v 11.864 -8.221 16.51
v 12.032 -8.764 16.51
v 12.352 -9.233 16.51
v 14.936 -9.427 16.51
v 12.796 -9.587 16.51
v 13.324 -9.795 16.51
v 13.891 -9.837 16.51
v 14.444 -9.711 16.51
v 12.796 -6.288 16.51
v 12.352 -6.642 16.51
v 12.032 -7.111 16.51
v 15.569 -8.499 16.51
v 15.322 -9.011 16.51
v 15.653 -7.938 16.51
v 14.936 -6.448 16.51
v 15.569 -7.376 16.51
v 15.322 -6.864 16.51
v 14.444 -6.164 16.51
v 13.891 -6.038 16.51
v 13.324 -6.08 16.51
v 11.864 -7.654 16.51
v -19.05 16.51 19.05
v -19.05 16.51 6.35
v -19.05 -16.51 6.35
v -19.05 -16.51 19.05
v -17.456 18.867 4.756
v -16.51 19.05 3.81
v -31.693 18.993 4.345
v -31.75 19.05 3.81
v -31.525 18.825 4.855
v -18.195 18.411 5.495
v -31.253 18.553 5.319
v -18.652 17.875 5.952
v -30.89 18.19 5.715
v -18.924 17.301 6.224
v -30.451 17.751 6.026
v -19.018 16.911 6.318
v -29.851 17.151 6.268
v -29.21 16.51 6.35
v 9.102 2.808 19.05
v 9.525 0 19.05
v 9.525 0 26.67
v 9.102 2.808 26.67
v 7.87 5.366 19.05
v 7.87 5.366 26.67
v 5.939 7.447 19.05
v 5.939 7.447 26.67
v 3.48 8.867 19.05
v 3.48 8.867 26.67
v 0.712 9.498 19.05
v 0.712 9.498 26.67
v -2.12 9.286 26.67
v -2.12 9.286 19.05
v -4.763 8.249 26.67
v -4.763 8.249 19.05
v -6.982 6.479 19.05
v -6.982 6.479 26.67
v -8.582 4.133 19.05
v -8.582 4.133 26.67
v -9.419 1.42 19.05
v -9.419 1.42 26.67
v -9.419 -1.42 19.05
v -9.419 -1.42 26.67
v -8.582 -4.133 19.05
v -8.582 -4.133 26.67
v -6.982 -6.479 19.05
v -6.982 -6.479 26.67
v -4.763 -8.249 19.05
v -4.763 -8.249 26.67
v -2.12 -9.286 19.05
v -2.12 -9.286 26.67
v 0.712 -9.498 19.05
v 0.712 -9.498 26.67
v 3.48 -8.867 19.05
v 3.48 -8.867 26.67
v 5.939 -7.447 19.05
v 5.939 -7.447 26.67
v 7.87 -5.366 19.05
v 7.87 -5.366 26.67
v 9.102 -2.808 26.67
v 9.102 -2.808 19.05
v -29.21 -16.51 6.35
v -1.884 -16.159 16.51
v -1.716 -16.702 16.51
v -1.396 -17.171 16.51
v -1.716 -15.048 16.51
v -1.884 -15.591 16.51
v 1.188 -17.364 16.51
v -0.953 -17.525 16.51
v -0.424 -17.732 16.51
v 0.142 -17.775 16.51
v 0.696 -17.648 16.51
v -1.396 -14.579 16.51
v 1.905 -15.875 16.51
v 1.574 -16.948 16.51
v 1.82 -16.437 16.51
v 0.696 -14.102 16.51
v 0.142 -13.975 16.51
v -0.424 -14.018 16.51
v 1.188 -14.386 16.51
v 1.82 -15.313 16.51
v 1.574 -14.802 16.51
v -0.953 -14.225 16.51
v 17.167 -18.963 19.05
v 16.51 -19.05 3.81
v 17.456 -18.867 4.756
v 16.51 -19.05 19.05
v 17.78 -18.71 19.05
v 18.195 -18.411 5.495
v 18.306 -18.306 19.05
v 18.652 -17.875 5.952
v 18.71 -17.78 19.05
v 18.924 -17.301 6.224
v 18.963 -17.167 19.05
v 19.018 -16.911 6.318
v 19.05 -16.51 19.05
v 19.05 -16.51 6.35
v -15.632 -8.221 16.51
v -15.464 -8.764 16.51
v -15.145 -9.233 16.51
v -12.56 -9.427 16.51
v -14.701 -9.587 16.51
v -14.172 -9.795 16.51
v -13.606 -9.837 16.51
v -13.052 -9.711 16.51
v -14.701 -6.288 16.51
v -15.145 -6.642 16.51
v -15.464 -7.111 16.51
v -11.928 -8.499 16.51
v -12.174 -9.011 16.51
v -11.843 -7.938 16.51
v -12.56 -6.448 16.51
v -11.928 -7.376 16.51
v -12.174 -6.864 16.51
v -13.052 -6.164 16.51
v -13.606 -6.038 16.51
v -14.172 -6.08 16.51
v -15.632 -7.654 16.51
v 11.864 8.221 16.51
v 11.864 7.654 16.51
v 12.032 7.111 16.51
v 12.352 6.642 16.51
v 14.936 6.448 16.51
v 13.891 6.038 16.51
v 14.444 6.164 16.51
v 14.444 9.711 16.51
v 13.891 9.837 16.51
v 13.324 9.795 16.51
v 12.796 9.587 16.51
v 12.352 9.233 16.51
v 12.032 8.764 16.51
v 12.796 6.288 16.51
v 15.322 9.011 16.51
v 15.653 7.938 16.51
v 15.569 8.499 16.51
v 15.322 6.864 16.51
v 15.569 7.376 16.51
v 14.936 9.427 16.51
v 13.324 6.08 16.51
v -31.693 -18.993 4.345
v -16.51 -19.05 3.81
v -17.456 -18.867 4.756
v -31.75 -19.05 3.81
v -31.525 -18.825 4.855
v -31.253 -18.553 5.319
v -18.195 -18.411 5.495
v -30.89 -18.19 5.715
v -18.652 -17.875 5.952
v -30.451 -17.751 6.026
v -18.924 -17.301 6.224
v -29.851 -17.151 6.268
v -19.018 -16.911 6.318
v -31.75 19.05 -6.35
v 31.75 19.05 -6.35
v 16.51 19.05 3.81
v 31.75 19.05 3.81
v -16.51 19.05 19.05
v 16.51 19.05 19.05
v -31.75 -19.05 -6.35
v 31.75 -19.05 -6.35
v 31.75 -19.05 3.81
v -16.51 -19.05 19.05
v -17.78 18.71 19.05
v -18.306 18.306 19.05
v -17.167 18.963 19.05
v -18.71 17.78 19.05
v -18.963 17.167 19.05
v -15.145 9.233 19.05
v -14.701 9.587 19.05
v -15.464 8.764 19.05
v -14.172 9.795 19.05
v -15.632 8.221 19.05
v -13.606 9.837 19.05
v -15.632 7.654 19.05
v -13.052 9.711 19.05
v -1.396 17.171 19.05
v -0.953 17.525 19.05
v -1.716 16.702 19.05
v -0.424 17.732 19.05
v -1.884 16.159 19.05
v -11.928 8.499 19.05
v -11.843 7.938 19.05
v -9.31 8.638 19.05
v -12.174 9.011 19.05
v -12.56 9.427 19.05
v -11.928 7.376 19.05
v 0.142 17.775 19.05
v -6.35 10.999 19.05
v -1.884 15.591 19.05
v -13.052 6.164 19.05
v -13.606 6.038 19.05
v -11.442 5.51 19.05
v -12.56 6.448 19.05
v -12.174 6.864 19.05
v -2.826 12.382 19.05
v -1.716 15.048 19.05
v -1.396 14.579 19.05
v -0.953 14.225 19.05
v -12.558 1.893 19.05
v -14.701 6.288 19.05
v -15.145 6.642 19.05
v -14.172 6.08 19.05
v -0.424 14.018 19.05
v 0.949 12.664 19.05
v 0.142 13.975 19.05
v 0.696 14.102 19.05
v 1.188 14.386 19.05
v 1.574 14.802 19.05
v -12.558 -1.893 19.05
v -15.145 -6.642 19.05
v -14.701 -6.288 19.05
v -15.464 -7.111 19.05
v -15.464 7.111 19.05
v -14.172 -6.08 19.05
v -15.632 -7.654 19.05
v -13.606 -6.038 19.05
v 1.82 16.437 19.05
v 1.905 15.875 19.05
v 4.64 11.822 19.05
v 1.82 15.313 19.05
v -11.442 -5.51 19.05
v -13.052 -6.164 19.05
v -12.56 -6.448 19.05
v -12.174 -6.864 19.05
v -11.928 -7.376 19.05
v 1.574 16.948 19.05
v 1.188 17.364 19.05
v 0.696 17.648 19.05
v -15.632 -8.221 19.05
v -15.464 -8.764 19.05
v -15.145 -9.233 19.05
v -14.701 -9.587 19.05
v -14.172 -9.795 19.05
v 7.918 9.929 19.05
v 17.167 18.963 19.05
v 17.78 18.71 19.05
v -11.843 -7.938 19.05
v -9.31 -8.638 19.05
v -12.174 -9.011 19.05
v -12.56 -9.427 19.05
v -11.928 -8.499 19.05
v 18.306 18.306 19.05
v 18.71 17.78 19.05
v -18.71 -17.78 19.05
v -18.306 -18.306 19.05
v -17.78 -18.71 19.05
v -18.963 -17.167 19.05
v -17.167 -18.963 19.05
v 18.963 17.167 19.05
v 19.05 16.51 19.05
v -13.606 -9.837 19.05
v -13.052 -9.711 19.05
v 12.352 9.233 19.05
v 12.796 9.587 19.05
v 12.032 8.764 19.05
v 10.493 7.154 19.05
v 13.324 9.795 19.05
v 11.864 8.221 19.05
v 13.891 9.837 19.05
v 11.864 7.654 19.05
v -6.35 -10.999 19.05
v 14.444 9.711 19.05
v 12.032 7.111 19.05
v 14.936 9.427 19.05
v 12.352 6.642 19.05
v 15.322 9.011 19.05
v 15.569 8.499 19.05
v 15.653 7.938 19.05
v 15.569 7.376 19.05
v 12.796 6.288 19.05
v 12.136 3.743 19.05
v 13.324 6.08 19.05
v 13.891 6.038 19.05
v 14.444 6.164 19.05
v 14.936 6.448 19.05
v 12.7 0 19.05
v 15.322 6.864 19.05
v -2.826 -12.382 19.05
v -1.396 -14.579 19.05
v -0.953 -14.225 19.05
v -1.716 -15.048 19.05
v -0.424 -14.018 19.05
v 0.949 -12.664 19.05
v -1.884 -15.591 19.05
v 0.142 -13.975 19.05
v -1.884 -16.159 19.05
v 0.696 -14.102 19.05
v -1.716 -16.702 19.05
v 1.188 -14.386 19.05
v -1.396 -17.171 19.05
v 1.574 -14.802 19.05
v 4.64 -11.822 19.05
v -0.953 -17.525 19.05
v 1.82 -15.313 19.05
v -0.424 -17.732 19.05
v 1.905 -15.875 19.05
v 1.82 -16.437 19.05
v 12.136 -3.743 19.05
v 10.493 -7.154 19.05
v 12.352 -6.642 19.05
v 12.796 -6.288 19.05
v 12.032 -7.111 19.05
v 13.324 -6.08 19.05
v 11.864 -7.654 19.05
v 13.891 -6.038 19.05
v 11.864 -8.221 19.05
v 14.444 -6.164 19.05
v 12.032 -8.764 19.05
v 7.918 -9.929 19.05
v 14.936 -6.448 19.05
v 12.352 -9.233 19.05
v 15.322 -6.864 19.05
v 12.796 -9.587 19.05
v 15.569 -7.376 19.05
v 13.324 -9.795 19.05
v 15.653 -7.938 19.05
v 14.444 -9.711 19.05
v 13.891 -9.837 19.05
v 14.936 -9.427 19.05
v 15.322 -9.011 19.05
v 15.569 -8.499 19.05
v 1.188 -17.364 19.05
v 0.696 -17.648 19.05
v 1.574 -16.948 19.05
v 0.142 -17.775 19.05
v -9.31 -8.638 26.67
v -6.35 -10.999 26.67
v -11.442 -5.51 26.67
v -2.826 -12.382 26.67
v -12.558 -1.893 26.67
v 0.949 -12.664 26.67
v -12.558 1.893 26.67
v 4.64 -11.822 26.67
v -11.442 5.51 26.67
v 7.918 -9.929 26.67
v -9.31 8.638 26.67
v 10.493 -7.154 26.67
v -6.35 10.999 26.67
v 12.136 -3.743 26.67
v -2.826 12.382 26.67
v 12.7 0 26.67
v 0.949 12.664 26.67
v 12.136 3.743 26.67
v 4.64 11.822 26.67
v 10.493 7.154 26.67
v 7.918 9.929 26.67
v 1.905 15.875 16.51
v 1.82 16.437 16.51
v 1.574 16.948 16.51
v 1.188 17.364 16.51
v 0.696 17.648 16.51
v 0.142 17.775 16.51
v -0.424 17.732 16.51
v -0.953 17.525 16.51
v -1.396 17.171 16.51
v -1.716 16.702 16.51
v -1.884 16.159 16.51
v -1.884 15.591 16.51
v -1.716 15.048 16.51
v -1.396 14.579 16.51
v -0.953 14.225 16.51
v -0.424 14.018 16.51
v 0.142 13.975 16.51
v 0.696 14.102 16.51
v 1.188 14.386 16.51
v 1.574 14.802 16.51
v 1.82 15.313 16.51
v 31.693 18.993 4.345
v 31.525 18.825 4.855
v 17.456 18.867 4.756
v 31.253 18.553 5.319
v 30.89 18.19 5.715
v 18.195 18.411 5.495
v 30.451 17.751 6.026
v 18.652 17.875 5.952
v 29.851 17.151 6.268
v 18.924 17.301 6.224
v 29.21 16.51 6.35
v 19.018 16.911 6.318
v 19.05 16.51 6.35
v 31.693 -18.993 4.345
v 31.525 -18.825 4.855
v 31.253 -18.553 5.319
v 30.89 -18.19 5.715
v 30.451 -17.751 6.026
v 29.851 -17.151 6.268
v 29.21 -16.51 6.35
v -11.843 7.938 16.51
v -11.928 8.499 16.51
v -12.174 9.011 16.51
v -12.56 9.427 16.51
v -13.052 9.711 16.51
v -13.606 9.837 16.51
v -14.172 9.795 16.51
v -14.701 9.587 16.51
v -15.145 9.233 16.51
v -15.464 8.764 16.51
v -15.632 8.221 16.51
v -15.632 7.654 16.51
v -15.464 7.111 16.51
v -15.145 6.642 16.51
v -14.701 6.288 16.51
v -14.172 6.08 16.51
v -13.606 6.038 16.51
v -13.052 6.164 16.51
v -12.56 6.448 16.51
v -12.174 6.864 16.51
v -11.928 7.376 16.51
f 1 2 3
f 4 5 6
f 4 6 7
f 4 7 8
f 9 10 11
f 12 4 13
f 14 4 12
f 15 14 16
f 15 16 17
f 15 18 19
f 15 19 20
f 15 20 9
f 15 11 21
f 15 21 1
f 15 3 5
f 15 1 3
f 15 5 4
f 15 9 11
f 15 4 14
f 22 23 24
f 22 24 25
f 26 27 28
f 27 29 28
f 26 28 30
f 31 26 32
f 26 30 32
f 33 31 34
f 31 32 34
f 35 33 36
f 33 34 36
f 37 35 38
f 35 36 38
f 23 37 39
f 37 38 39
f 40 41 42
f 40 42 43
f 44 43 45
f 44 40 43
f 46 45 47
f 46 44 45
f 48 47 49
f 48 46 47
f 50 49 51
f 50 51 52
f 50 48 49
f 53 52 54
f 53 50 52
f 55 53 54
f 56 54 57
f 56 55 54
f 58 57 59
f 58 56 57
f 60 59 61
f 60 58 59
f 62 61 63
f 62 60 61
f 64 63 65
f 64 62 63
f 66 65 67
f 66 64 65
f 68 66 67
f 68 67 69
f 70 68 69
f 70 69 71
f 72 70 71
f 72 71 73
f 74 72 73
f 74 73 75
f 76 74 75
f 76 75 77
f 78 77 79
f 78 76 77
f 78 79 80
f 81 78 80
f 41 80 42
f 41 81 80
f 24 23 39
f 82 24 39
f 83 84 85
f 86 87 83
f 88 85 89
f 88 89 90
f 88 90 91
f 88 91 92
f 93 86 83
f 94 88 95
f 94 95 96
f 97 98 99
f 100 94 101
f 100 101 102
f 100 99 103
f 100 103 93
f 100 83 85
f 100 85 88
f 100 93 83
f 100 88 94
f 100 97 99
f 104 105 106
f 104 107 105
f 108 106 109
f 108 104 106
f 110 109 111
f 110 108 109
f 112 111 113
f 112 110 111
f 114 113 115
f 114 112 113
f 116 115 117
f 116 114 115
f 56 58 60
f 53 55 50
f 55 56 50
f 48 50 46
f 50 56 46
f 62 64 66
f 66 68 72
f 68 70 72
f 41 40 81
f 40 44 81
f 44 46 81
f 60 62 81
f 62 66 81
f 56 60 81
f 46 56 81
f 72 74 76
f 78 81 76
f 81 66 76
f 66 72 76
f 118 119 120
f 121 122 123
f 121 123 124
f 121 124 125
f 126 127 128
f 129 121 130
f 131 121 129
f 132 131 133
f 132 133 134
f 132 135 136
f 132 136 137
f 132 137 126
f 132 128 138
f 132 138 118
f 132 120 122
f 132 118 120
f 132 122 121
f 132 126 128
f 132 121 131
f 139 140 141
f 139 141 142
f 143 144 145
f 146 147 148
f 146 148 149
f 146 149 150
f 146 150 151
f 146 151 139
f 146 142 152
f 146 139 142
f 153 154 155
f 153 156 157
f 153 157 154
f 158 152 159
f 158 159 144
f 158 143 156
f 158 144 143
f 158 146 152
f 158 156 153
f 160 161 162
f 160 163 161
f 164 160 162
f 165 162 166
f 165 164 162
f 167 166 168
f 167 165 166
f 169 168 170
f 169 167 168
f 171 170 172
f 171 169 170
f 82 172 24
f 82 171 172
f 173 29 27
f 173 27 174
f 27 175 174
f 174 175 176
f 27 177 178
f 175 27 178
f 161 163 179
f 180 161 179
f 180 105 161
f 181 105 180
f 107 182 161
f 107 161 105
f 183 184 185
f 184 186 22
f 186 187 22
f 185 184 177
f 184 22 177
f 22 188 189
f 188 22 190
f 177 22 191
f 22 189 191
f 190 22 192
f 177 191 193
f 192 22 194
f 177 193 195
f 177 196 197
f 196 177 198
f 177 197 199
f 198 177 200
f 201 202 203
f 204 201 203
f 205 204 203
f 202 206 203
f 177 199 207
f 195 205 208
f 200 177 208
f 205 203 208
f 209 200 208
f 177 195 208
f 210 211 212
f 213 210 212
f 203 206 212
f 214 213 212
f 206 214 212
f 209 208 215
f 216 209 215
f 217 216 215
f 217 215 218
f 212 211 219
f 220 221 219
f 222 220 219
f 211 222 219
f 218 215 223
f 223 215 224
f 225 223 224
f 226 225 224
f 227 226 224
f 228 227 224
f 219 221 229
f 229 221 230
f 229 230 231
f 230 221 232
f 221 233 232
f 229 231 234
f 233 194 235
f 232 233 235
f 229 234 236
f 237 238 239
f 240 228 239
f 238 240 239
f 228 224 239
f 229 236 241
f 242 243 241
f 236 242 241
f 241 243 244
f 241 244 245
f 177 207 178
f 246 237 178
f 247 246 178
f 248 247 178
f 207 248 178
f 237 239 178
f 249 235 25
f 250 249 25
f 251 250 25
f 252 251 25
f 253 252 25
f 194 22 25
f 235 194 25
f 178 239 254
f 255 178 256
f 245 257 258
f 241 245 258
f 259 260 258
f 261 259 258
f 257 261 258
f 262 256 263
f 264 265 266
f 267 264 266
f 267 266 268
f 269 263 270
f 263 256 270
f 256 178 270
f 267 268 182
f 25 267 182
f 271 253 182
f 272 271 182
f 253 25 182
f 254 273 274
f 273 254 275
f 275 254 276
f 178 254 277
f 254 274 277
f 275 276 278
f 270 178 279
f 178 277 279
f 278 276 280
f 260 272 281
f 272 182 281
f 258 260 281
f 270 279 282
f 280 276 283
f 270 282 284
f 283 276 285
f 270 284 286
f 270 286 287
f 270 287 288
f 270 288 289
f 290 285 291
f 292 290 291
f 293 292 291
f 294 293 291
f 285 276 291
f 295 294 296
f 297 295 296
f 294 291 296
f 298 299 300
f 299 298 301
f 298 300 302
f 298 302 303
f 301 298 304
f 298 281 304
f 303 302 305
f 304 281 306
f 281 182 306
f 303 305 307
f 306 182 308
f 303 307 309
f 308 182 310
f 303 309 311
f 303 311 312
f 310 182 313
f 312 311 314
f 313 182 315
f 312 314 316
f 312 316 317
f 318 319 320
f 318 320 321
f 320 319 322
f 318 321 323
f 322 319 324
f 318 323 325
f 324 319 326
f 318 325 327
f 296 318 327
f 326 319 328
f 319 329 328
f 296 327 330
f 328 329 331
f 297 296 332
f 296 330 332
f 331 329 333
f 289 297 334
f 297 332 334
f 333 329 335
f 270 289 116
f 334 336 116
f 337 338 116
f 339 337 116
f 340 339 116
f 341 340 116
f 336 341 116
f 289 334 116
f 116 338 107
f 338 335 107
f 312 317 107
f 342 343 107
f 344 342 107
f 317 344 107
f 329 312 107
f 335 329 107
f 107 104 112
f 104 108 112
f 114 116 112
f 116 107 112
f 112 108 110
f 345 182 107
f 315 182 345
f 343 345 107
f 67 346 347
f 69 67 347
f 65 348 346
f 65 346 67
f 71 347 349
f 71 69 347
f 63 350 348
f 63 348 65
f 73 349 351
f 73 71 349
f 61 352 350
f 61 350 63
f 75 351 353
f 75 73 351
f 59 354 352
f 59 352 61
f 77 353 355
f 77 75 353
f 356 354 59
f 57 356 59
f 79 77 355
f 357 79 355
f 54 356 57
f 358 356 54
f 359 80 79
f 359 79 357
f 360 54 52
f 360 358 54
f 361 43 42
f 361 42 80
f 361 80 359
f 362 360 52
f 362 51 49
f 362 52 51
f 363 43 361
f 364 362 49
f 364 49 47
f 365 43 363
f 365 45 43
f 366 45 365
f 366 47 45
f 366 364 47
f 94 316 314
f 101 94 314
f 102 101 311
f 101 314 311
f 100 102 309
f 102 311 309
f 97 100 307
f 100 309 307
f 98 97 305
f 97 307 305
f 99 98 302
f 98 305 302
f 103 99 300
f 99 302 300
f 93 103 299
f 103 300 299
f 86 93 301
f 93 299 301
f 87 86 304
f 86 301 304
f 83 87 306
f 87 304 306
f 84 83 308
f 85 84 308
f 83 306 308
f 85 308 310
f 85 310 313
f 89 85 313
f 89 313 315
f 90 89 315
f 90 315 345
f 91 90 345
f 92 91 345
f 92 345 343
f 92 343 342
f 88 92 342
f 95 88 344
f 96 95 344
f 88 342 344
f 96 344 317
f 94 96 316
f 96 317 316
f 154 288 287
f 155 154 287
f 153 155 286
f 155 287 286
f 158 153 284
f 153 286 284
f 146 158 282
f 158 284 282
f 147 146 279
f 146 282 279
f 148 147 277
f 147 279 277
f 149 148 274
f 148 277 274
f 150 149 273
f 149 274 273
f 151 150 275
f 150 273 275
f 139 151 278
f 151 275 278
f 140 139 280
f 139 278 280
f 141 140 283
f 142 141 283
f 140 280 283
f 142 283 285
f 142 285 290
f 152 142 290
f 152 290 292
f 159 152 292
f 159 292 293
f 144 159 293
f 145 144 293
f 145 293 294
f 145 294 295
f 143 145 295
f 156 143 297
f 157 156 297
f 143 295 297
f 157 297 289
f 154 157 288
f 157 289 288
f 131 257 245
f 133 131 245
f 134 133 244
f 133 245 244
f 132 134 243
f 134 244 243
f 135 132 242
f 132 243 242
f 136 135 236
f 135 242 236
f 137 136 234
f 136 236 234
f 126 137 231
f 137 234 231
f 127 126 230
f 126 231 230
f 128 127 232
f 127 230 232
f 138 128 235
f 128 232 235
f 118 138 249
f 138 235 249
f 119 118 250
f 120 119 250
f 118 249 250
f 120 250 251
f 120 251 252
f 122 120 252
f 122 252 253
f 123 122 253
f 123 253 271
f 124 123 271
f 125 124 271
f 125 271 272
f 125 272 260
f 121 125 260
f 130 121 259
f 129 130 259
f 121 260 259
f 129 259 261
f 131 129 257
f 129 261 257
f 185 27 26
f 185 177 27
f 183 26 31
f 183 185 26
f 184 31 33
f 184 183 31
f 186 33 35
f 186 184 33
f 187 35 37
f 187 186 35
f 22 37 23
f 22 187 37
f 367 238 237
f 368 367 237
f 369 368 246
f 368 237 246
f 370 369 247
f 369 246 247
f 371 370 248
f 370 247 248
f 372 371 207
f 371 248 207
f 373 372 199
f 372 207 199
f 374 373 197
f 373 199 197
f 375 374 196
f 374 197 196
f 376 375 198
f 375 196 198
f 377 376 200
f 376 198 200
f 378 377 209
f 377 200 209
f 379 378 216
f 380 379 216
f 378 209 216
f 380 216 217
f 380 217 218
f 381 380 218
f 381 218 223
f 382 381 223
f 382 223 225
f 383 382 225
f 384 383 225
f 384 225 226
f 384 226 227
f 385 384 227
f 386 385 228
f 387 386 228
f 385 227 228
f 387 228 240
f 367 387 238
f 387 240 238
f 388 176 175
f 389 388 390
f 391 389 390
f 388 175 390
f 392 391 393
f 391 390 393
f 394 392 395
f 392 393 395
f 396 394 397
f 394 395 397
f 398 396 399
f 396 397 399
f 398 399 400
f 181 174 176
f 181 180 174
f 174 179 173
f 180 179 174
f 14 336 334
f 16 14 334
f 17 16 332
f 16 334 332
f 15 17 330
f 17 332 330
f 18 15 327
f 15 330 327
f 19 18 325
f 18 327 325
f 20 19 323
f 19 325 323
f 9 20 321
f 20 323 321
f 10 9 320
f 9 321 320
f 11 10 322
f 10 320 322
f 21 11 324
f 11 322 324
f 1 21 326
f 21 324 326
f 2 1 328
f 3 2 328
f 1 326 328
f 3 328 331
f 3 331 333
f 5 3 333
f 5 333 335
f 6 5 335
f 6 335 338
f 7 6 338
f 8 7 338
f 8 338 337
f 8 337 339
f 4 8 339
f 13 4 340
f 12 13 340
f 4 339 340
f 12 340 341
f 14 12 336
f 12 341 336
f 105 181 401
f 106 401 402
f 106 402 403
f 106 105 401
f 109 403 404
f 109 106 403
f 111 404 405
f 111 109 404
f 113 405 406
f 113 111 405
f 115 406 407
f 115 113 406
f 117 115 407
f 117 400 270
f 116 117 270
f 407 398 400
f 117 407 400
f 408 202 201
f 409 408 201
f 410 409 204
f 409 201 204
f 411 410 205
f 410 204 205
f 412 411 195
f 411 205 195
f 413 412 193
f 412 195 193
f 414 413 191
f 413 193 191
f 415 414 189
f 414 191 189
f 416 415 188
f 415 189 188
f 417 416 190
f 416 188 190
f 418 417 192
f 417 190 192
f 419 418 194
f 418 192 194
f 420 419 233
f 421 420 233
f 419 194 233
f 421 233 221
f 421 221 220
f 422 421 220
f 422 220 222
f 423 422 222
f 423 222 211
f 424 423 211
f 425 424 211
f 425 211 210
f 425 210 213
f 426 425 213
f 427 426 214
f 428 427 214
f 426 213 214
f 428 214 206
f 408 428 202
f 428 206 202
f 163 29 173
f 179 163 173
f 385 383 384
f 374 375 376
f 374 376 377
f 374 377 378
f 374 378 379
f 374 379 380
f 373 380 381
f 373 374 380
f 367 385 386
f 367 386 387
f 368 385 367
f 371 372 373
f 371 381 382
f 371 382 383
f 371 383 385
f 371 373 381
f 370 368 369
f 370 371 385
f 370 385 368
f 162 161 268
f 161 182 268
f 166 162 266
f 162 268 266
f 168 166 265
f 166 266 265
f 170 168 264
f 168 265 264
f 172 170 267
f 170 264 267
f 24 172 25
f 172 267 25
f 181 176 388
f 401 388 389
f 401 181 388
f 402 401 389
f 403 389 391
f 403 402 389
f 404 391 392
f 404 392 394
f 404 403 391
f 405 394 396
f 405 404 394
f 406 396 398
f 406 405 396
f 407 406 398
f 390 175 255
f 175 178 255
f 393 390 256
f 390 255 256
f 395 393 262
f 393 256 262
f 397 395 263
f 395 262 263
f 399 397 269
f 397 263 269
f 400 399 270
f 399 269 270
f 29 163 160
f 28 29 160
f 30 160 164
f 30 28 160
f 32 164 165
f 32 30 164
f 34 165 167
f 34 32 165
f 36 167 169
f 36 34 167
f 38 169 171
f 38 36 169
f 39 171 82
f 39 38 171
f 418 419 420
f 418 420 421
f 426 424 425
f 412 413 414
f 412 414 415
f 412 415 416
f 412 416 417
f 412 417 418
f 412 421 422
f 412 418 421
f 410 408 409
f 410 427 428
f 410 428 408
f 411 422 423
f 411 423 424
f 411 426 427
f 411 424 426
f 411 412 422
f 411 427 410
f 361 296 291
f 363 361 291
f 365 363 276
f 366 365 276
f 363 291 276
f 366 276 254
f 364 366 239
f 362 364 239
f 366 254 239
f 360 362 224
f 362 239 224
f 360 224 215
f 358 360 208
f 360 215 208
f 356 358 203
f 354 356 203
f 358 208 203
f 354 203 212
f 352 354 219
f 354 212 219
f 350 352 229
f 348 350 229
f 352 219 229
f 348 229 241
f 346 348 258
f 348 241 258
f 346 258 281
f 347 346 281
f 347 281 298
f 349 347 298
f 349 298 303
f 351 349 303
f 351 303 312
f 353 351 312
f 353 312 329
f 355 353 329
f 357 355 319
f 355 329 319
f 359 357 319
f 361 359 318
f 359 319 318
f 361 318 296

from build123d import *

# Parameters (mm, degrees)
F0_W     = 38.1
F0_H     = 12.7
F1_DEPTH = 19.05
F2_R     = 12.7
F2_R_2   = 9.525
F3_DEPTH = 7.62
F4_R     = 1.905
F5_DEPTH = 2.54
F6_R     = 2.54


with BuildPart() as f1:
    # F0 (on Front) → F1 (new body, symmetric)
    with BuildSketch(Plane.XZ):
        Polygon((-19.05, 6.35), (-31.75, 6.35), (-31.75, -6.35), (31.75, -6.35), (31.75, 6.35), (19.05, 6.35), align=None)
        with Locations((0, 12.7)):
            Rectangle(F0_W, F0_H)
    extrude(amount=F1_DEPTH, both=True)

    # F2 (on face) → F3 (join)
    with BuildSketch(Plane.XY.offset(19.05)):
        Circle(F2_R)
        Circle(F2_R_2, mode=Mode.SUBTRACT)
    extrude(amount=F3_DEPTH)

    # F4 (on face) → F5 (cut)
    with BuildSketch(Plane.XY.offset(19.05)):
        with Locations((13.748153, -7.9375)):
            Circle(F4_R)
        with Locations((13.748153, 7.9375)):
            Circle(F4_R)
        with Locations((0, 15.875)):
            Circle(F4_R)
        with Locations((-13.748153, 7.9375)):
            Circle(F4_R)
        with Locations((-13.748153, -7.9375)):
            Circle(F4_R)
        with Locations((0, -15.875)):
            Circle(F4_R)
    extrude(amount=-F5_DEPTH, mode=Mode.SUBTRACT)

    # F6
    f6_edges = [f1.edges().sort_by_distance(p)[0] for p in [
        (25.4, 19.05, 6.35),
        (31.75, 0, 6.35),
        (25.4, -19.05, 6.35),
        (-19.05, 19.05, 12.7),
        (-25.4, 19.05, 6.35),
        (-31.75, 0, 6.35),
        (-25.4, -19.05, 6.35),
        (-19.05, -19.05, 12.7),
        (19.05, -19.05, 12.7),
        (19.05, 19.05, 12.7),
    ]]
    fillet(f6_edges, radius=F6_R)


solid = f1.part
